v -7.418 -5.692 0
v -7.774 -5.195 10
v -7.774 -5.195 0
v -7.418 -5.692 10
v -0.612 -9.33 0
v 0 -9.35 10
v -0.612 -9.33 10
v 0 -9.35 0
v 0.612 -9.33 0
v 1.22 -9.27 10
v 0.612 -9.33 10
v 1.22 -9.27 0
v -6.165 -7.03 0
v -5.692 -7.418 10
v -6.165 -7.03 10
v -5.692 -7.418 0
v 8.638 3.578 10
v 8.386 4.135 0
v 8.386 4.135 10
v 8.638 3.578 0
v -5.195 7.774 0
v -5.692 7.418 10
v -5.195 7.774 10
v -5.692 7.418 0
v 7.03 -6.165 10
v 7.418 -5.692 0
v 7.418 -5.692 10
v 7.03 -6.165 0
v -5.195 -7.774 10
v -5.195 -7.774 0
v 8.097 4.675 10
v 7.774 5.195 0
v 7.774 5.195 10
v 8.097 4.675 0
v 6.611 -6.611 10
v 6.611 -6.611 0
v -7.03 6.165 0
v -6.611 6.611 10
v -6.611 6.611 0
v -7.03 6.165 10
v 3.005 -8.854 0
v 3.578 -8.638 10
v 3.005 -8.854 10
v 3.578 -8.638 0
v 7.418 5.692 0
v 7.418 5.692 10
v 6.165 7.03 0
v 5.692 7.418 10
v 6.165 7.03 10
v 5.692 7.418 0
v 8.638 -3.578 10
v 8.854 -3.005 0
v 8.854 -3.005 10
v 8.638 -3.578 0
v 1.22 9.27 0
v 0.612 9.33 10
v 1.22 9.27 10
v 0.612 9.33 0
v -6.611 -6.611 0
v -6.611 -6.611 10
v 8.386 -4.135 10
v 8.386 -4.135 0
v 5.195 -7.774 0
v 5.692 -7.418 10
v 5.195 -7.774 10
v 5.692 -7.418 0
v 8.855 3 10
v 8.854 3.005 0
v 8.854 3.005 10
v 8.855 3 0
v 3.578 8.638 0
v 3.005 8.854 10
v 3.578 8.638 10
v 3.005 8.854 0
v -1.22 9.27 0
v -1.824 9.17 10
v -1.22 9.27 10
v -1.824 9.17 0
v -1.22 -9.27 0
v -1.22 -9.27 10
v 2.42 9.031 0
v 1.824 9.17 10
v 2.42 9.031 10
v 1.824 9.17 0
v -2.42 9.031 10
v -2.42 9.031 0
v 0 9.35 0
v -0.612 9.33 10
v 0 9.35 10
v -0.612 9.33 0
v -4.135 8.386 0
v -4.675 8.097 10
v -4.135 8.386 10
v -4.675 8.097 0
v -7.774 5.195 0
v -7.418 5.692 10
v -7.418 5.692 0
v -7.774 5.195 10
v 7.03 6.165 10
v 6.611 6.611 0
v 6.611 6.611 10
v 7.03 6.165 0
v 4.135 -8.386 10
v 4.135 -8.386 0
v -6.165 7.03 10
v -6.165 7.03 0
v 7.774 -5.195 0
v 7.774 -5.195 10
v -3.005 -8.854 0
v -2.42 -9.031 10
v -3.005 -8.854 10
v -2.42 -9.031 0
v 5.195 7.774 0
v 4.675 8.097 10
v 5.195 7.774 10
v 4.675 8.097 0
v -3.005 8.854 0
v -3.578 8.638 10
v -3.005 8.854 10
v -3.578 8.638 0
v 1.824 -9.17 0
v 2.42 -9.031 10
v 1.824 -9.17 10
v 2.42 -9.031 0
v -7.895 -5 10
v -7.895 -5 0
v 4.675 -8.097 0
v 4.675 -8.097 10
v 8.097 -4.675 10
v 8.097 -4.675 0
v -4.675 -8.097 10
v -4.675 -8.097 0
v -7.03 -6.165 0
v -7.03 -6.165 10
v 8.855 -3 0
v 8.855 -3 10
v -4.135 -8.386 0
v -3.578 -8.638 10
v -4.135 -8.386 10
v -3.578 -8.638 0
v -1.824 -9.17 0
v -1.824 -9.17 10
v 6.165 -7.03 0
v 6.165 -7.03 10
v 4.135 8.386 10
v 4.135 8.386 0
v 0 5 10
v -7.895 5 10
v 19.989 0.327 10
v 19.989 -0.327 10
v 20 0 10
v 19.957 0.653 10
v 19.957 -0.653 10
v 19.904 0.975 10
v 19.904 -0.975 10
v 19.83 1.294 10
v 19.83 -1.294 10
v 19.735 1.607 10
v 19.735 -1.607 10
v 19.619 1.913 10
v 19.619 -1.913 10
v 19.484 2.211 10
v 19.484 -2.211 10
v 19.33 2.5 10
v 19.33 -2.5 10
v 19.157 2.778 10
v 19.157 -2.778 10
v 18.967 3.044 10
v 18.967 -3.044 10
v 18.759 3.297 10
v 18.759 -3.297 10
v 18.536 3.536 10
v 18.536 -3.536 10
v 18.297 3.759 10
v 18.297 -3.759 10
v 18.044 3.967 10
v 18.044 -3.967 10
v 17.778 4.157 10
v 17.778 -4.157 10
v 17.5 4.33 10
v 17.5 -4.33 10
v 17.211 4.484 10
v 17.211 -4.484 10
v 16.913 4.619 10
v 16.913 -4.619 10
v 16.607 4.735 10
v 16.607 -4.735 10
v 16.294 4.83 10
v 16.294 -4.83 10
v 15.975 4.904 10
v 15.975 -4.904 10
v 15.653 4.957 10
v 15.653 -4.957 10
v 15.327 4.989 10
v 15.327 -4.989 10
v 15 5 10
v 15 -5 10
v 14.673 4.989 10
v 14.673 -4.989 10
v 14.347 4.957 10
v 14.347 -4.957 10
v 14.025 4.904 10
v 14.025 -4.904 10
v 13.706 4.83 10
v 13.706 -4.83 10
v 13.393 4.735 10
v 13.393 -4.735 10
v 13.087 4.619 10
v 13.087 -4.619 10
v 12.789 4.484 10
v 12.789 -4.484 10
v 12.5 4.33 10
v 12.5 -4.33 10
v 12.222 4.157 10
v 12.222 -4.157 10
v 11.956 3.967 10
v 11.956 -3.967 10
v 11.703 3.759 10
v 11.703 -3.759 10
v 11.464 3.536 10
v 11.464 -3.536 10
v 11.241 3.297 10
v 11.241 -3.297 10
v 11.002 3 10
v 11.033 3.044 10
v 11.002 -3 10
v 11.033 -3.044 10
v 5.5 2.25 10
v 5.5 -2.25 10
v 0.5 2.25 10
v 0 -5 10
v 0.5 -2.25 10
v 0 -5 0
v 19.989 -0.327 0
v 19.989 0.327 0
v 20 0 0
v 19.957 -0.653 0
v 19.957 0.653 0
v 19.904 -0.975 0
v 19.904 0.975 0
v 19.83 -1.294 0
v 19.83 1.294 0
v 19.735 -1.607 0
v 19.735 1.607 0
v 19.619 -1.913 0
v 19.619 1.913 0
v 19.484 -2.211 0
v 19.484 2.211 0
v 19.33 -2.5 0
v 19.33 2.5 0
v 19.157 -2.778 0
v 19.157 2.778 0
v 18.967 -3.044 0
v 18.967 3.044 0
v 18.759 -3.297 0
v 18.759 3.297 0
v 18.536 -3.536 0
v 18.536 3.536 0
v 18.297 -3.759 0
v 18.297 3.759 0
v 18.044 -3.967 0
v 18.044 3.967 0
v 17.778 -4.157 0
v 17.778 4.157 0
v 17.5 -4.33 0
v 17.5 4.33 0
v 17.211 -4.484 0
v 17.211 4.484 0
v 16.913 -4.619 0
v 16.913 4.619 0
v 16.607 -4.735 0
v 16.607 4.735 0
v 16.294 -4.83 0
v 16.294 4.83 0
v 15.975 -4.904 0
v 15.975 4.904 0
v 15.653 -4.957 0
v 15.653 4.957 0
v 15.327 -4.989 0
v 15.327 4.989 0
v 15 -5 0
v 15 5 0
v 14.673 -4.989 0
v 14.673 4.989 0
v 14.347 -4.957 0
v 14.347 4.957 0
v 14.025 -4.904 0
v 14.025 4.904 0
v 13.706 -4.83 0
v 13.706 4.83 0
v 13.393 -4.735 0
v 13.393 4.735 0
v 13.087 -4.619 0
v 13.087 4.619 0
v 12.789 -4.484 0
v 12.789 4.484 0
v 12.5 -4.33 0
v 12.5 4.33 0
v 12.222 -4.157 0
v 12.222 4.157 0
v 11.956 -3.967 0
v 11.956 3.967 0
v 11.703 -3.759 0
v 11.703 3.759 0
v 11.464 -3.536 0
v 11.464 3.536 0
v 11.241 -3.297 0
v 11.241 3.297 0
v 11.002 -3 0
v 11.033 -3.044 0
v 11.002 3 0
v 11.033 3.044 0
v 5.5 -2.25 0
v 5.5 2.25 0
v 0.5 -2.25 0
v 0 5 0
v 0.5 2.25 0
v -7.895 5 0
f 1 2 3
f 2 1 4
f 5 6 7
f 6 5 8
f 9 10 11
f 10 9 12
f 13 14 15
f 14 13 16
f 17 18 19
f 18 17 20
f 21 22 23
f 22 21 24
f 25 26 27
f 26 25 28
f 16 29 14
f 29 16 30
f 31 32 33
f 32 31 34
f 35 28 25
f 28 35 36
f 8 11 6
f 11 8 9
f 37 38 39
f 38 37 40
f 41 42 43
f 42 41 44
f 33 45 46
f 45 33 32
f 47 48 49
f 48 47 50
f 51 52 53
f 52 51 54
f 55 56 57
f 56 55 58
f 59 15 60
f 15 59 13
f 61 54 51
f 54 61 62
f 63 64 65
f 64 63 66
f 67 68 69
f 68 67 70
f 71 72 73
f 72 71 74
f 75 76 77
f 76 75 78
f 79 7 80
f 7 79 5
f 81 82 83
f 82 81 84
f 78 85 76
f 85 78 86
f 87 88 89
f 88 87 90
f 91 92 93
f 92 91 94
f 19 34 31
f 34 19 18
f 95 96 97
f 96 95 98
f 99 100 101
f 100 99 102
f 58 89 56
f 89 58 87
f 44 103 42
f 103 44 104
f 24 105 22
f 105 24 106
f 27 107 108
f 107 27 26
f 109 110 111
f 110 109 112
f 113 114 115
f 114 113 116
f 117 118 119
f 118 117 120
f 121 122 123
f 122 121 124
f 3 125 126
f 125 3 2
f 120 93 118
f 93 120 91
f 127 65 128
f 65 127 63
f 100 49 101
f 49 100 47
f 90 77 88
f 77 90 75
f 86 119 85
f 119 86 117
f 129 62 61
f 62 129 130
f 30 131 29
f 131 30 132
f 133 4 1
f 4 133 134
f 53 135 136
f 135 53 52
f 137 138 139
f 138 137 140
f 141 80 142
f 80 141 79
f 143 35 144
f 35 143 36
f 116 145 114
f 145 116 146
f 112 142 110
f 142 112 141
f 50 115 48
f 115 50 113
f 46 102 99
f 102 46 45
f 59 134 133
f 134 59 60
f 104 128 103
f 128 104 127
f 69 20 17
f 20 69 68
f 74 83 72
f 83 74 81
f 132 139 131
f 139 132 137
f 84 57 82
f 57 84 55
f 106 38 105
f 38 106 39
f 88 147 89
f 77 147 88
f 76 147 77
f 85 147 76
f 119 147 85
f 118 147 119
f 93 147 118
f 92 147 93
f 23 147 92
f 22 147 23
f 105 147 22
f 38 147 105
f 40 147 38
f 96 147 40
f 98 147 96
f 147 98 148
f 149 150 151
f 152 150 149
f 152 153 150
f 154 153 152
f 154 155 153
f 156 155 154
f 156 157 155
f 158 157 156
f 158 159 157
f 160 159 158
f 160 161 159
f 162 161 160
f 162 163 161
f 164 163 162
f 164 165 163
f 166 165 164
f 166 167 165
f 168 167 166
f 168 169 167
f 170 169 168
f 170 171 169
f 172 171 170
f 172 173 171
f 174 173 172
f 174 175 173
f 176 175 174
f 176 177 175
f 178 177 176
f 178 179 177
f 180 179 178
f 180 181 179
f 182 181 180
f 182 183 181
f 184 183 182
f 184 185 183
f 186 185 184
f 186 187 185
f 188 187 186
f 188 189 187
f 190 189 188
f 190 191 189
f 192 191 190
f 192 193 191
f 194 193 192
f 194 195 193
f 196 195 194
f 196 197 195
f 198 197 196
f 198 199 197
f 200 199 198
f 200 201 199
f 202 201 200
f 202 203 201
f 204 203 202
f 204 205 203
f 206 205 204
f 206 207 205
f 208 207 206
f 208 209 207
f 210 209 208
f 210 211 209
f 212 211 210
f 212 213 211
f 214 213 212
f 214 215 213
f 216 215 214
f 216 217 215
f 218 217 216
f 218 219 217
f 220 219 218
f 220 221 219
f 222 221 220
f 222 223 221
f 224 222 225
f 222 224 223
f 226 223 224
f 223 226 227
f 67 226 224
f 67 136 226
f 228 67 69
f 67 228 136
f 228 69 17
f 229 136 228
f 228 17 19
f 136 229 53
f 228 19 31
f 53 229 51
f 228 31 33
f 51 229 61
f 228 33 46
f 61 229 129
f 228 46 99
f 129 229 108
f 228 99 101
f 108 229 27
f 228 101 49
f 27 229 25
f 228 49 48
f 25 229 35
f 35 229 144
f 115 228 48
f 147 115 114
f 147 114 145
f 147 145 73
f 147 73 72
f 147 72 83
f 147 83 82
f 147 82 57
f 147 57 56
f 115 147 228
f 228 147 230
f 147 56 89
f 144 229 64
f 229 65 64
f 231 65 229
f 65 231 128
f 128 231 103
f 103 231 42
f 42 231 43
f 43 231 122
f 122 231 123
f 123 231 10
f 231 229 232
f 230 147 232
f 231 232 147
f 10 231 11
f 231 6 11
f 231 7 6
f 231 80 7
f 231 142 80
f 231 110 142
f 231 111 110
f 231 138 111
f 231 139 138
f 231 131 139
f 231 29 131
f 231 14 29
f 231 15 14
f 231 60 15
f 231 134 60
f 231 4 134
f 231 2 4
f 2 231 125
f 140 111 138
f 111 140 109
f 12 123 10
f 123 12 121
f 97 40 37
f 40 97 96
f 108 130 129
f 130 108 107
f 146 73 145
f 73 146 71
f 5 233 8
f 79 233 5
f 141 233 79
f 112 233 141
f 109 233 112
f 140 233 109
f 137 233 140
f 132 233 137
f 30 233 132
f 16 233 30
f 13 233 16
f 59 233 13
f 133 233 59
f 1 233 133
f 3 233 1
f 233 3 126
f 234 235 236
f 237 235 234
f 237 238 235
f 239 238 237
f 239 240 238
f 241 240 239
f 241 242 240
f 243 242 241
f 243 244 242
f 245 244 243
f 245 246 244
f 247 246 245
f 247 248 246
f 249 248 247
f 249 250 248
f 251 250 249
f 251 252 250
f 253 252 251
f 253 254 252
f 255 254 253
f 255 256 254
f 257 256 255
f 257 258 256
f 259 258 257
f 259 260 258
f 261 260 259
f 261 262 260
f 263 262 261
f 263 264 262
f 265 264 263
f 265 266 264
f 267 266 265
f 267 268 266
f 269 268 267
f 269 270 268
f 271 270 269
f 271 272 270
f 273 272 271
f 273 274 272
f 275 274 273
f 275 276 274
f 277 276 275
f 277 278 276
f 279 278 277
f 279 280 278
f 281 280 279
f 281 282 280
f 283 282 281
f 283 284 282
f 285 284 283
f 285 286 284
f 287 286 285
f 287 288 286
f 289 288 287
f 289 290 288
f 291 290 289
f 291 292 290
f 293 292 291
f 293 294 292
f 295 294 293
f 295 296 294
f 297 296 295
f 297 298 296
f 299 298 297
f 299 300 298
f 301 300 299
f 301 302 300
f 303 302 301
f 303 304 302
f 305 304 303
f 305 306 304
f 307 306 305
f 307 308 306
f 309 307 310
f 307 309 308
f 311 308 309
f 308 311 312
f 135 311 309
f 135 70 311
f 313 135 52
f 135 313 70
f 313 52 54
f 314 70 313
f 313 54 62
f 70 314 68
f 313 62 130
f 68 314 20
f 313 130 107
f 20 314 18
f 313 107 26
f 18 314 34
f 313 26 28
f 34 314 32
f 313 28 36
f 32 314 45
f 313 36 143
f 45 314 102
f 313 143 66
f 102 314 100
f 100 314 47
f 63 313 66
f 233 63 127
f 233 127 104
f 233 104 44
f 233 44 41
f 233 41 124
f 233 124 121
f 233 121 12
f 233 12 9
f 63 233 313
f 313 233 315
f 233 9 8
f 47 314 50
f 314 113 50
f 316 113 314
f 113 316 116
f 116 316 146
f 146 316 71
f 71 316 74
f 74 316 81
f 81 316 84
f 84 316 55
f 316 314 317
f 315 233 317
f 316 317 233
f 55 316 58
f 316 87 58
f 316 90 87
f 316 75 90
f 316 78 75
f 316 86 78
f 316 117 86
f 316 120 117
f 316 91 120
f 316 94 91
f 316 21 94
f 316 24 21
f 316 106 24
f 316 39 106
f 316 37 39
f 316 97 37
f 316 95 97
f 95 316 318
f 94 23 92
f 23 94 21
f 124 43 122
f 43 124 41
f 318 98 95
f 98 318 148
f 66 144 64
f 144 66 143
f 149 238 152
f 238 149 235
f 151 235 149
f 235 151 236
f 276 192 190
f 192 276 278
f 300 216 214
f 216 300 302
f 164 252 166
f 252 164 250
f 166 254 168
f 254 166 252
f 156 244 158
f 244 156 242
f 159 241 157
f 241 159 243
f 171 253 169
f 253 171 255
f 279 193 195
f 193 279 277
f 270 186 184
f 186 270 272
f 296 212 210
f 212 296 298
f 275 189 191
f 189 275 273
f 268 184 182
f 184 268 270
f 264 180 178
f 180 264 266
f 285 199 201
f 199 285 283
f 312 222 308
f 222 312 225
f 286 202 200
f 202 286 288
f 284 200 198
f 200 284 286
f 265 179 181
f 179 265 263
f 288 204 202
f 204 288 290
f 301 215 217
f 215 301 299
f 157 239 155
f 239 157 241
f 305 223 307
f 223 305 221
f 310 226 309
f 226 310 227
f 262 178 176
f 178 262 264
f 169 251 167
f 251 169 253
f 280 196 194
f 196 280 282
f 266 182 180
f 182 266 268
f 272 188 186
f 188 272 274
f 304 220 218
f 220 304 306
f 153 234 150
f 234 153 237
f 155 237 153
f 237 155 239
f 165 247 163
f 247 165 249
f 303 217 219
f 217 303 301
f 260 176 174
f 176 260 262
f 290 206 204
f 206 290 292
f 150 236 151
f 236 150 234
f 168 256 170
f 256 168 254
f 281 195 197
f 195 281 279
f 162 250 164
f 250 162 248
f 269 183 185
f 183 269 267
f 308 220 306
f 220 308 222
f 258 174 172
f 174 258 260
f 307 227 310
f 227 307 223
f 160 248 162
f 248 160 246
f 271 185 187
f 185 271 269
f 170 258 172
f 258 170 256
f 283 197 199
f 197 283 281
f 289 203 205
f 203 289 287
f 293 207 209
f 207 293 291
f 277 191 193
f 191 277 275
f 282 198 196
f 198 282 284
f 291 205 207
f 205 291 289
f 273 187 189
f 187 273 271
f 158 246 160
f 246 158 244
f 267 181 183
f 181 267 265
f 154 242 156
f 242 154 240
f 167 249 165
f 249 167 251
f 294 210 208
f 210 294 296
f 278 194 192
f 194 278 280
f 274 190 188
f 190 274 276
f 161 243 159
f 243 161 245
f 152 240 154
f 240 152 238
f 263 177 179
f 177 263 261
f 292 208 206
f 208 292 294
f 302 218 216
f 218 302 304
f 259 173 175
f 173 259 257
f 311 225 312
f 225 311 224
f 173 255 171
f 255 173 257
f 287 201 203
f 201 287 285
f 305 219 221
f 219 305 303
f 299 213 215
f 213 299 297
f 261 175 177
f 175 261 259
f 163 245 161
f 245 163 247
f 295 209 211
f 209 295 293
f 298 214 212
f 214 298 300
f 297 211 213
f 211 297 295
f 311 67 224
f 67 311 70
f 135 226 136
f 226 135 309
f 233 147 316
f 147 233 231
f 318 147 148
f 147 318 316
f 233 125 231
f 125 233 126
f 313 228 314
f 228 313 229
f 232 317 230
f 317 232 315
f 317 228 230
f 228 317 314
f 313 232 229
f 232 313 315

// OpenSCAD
// Tubing clip for 12.7 mm lab stand rod
// Print orientation: flat on bed, extrusion along +Z

// ---- Stand rod ring ----
stand_id   = 12.7;   // stand rod inner diameter
stand_wall = 3;      // stand ring wall thickness
stand_od   = stand_id + 2 * stand_wall;  // 18.7 mm outer diameter

// ---- Tubing ring ----
tube_id    = 6;      // tubing inner diameter
tube_wall  = 2;      // tubing wall thickness
tube_od    = tube_id + 2 * tube_wall;    // 10 mm outer diameter

// ---- Bridge ----
bridge_w   = 6;      // bridge width in Y
bridge_x0  = 8;      // bridge start in X
bridge_x1  = 12;     // bridge end in X

// ---- Cutouts ----
stand_cut  = 10;     // stand ring opening width (-X side)
tube_cut   = 4.5;    // tubing ring opening width (+X side)

// ---- Misc ----
eps        = 0.5;    // cutter overshoot past faces
$fn        = 96;     // curve resolution

difference() {
    union() {
        // Stand rod ring
        cylinder(d = stand_od, h = 10);

        // Tubing ring
        translate([15, 0, 0])
            cylinder(d = tube_od, h = 10);

        // Solid bridge
        translate([bridge_x0, -bridge_w / 2, 0])
            cube([bridge_x1 - bridge_x0, bridge_w, 10]);
    }

    // Stand ring opening (extends past -X face)
    translate([-stand_od / 2 - eps, -stand_cut / 2, -eps])
        cube([stand_od / 2 + eps, stand_cut, 10 + 2 * eps]);

    // Tubing ring opening (extends past +X face)
    translate([tube_od / 2 - tube_cut, -tube_cut / 2, -eps])
        cube([tube_cut + eps, tube_cut, 10 + 2 * eps]);
}
